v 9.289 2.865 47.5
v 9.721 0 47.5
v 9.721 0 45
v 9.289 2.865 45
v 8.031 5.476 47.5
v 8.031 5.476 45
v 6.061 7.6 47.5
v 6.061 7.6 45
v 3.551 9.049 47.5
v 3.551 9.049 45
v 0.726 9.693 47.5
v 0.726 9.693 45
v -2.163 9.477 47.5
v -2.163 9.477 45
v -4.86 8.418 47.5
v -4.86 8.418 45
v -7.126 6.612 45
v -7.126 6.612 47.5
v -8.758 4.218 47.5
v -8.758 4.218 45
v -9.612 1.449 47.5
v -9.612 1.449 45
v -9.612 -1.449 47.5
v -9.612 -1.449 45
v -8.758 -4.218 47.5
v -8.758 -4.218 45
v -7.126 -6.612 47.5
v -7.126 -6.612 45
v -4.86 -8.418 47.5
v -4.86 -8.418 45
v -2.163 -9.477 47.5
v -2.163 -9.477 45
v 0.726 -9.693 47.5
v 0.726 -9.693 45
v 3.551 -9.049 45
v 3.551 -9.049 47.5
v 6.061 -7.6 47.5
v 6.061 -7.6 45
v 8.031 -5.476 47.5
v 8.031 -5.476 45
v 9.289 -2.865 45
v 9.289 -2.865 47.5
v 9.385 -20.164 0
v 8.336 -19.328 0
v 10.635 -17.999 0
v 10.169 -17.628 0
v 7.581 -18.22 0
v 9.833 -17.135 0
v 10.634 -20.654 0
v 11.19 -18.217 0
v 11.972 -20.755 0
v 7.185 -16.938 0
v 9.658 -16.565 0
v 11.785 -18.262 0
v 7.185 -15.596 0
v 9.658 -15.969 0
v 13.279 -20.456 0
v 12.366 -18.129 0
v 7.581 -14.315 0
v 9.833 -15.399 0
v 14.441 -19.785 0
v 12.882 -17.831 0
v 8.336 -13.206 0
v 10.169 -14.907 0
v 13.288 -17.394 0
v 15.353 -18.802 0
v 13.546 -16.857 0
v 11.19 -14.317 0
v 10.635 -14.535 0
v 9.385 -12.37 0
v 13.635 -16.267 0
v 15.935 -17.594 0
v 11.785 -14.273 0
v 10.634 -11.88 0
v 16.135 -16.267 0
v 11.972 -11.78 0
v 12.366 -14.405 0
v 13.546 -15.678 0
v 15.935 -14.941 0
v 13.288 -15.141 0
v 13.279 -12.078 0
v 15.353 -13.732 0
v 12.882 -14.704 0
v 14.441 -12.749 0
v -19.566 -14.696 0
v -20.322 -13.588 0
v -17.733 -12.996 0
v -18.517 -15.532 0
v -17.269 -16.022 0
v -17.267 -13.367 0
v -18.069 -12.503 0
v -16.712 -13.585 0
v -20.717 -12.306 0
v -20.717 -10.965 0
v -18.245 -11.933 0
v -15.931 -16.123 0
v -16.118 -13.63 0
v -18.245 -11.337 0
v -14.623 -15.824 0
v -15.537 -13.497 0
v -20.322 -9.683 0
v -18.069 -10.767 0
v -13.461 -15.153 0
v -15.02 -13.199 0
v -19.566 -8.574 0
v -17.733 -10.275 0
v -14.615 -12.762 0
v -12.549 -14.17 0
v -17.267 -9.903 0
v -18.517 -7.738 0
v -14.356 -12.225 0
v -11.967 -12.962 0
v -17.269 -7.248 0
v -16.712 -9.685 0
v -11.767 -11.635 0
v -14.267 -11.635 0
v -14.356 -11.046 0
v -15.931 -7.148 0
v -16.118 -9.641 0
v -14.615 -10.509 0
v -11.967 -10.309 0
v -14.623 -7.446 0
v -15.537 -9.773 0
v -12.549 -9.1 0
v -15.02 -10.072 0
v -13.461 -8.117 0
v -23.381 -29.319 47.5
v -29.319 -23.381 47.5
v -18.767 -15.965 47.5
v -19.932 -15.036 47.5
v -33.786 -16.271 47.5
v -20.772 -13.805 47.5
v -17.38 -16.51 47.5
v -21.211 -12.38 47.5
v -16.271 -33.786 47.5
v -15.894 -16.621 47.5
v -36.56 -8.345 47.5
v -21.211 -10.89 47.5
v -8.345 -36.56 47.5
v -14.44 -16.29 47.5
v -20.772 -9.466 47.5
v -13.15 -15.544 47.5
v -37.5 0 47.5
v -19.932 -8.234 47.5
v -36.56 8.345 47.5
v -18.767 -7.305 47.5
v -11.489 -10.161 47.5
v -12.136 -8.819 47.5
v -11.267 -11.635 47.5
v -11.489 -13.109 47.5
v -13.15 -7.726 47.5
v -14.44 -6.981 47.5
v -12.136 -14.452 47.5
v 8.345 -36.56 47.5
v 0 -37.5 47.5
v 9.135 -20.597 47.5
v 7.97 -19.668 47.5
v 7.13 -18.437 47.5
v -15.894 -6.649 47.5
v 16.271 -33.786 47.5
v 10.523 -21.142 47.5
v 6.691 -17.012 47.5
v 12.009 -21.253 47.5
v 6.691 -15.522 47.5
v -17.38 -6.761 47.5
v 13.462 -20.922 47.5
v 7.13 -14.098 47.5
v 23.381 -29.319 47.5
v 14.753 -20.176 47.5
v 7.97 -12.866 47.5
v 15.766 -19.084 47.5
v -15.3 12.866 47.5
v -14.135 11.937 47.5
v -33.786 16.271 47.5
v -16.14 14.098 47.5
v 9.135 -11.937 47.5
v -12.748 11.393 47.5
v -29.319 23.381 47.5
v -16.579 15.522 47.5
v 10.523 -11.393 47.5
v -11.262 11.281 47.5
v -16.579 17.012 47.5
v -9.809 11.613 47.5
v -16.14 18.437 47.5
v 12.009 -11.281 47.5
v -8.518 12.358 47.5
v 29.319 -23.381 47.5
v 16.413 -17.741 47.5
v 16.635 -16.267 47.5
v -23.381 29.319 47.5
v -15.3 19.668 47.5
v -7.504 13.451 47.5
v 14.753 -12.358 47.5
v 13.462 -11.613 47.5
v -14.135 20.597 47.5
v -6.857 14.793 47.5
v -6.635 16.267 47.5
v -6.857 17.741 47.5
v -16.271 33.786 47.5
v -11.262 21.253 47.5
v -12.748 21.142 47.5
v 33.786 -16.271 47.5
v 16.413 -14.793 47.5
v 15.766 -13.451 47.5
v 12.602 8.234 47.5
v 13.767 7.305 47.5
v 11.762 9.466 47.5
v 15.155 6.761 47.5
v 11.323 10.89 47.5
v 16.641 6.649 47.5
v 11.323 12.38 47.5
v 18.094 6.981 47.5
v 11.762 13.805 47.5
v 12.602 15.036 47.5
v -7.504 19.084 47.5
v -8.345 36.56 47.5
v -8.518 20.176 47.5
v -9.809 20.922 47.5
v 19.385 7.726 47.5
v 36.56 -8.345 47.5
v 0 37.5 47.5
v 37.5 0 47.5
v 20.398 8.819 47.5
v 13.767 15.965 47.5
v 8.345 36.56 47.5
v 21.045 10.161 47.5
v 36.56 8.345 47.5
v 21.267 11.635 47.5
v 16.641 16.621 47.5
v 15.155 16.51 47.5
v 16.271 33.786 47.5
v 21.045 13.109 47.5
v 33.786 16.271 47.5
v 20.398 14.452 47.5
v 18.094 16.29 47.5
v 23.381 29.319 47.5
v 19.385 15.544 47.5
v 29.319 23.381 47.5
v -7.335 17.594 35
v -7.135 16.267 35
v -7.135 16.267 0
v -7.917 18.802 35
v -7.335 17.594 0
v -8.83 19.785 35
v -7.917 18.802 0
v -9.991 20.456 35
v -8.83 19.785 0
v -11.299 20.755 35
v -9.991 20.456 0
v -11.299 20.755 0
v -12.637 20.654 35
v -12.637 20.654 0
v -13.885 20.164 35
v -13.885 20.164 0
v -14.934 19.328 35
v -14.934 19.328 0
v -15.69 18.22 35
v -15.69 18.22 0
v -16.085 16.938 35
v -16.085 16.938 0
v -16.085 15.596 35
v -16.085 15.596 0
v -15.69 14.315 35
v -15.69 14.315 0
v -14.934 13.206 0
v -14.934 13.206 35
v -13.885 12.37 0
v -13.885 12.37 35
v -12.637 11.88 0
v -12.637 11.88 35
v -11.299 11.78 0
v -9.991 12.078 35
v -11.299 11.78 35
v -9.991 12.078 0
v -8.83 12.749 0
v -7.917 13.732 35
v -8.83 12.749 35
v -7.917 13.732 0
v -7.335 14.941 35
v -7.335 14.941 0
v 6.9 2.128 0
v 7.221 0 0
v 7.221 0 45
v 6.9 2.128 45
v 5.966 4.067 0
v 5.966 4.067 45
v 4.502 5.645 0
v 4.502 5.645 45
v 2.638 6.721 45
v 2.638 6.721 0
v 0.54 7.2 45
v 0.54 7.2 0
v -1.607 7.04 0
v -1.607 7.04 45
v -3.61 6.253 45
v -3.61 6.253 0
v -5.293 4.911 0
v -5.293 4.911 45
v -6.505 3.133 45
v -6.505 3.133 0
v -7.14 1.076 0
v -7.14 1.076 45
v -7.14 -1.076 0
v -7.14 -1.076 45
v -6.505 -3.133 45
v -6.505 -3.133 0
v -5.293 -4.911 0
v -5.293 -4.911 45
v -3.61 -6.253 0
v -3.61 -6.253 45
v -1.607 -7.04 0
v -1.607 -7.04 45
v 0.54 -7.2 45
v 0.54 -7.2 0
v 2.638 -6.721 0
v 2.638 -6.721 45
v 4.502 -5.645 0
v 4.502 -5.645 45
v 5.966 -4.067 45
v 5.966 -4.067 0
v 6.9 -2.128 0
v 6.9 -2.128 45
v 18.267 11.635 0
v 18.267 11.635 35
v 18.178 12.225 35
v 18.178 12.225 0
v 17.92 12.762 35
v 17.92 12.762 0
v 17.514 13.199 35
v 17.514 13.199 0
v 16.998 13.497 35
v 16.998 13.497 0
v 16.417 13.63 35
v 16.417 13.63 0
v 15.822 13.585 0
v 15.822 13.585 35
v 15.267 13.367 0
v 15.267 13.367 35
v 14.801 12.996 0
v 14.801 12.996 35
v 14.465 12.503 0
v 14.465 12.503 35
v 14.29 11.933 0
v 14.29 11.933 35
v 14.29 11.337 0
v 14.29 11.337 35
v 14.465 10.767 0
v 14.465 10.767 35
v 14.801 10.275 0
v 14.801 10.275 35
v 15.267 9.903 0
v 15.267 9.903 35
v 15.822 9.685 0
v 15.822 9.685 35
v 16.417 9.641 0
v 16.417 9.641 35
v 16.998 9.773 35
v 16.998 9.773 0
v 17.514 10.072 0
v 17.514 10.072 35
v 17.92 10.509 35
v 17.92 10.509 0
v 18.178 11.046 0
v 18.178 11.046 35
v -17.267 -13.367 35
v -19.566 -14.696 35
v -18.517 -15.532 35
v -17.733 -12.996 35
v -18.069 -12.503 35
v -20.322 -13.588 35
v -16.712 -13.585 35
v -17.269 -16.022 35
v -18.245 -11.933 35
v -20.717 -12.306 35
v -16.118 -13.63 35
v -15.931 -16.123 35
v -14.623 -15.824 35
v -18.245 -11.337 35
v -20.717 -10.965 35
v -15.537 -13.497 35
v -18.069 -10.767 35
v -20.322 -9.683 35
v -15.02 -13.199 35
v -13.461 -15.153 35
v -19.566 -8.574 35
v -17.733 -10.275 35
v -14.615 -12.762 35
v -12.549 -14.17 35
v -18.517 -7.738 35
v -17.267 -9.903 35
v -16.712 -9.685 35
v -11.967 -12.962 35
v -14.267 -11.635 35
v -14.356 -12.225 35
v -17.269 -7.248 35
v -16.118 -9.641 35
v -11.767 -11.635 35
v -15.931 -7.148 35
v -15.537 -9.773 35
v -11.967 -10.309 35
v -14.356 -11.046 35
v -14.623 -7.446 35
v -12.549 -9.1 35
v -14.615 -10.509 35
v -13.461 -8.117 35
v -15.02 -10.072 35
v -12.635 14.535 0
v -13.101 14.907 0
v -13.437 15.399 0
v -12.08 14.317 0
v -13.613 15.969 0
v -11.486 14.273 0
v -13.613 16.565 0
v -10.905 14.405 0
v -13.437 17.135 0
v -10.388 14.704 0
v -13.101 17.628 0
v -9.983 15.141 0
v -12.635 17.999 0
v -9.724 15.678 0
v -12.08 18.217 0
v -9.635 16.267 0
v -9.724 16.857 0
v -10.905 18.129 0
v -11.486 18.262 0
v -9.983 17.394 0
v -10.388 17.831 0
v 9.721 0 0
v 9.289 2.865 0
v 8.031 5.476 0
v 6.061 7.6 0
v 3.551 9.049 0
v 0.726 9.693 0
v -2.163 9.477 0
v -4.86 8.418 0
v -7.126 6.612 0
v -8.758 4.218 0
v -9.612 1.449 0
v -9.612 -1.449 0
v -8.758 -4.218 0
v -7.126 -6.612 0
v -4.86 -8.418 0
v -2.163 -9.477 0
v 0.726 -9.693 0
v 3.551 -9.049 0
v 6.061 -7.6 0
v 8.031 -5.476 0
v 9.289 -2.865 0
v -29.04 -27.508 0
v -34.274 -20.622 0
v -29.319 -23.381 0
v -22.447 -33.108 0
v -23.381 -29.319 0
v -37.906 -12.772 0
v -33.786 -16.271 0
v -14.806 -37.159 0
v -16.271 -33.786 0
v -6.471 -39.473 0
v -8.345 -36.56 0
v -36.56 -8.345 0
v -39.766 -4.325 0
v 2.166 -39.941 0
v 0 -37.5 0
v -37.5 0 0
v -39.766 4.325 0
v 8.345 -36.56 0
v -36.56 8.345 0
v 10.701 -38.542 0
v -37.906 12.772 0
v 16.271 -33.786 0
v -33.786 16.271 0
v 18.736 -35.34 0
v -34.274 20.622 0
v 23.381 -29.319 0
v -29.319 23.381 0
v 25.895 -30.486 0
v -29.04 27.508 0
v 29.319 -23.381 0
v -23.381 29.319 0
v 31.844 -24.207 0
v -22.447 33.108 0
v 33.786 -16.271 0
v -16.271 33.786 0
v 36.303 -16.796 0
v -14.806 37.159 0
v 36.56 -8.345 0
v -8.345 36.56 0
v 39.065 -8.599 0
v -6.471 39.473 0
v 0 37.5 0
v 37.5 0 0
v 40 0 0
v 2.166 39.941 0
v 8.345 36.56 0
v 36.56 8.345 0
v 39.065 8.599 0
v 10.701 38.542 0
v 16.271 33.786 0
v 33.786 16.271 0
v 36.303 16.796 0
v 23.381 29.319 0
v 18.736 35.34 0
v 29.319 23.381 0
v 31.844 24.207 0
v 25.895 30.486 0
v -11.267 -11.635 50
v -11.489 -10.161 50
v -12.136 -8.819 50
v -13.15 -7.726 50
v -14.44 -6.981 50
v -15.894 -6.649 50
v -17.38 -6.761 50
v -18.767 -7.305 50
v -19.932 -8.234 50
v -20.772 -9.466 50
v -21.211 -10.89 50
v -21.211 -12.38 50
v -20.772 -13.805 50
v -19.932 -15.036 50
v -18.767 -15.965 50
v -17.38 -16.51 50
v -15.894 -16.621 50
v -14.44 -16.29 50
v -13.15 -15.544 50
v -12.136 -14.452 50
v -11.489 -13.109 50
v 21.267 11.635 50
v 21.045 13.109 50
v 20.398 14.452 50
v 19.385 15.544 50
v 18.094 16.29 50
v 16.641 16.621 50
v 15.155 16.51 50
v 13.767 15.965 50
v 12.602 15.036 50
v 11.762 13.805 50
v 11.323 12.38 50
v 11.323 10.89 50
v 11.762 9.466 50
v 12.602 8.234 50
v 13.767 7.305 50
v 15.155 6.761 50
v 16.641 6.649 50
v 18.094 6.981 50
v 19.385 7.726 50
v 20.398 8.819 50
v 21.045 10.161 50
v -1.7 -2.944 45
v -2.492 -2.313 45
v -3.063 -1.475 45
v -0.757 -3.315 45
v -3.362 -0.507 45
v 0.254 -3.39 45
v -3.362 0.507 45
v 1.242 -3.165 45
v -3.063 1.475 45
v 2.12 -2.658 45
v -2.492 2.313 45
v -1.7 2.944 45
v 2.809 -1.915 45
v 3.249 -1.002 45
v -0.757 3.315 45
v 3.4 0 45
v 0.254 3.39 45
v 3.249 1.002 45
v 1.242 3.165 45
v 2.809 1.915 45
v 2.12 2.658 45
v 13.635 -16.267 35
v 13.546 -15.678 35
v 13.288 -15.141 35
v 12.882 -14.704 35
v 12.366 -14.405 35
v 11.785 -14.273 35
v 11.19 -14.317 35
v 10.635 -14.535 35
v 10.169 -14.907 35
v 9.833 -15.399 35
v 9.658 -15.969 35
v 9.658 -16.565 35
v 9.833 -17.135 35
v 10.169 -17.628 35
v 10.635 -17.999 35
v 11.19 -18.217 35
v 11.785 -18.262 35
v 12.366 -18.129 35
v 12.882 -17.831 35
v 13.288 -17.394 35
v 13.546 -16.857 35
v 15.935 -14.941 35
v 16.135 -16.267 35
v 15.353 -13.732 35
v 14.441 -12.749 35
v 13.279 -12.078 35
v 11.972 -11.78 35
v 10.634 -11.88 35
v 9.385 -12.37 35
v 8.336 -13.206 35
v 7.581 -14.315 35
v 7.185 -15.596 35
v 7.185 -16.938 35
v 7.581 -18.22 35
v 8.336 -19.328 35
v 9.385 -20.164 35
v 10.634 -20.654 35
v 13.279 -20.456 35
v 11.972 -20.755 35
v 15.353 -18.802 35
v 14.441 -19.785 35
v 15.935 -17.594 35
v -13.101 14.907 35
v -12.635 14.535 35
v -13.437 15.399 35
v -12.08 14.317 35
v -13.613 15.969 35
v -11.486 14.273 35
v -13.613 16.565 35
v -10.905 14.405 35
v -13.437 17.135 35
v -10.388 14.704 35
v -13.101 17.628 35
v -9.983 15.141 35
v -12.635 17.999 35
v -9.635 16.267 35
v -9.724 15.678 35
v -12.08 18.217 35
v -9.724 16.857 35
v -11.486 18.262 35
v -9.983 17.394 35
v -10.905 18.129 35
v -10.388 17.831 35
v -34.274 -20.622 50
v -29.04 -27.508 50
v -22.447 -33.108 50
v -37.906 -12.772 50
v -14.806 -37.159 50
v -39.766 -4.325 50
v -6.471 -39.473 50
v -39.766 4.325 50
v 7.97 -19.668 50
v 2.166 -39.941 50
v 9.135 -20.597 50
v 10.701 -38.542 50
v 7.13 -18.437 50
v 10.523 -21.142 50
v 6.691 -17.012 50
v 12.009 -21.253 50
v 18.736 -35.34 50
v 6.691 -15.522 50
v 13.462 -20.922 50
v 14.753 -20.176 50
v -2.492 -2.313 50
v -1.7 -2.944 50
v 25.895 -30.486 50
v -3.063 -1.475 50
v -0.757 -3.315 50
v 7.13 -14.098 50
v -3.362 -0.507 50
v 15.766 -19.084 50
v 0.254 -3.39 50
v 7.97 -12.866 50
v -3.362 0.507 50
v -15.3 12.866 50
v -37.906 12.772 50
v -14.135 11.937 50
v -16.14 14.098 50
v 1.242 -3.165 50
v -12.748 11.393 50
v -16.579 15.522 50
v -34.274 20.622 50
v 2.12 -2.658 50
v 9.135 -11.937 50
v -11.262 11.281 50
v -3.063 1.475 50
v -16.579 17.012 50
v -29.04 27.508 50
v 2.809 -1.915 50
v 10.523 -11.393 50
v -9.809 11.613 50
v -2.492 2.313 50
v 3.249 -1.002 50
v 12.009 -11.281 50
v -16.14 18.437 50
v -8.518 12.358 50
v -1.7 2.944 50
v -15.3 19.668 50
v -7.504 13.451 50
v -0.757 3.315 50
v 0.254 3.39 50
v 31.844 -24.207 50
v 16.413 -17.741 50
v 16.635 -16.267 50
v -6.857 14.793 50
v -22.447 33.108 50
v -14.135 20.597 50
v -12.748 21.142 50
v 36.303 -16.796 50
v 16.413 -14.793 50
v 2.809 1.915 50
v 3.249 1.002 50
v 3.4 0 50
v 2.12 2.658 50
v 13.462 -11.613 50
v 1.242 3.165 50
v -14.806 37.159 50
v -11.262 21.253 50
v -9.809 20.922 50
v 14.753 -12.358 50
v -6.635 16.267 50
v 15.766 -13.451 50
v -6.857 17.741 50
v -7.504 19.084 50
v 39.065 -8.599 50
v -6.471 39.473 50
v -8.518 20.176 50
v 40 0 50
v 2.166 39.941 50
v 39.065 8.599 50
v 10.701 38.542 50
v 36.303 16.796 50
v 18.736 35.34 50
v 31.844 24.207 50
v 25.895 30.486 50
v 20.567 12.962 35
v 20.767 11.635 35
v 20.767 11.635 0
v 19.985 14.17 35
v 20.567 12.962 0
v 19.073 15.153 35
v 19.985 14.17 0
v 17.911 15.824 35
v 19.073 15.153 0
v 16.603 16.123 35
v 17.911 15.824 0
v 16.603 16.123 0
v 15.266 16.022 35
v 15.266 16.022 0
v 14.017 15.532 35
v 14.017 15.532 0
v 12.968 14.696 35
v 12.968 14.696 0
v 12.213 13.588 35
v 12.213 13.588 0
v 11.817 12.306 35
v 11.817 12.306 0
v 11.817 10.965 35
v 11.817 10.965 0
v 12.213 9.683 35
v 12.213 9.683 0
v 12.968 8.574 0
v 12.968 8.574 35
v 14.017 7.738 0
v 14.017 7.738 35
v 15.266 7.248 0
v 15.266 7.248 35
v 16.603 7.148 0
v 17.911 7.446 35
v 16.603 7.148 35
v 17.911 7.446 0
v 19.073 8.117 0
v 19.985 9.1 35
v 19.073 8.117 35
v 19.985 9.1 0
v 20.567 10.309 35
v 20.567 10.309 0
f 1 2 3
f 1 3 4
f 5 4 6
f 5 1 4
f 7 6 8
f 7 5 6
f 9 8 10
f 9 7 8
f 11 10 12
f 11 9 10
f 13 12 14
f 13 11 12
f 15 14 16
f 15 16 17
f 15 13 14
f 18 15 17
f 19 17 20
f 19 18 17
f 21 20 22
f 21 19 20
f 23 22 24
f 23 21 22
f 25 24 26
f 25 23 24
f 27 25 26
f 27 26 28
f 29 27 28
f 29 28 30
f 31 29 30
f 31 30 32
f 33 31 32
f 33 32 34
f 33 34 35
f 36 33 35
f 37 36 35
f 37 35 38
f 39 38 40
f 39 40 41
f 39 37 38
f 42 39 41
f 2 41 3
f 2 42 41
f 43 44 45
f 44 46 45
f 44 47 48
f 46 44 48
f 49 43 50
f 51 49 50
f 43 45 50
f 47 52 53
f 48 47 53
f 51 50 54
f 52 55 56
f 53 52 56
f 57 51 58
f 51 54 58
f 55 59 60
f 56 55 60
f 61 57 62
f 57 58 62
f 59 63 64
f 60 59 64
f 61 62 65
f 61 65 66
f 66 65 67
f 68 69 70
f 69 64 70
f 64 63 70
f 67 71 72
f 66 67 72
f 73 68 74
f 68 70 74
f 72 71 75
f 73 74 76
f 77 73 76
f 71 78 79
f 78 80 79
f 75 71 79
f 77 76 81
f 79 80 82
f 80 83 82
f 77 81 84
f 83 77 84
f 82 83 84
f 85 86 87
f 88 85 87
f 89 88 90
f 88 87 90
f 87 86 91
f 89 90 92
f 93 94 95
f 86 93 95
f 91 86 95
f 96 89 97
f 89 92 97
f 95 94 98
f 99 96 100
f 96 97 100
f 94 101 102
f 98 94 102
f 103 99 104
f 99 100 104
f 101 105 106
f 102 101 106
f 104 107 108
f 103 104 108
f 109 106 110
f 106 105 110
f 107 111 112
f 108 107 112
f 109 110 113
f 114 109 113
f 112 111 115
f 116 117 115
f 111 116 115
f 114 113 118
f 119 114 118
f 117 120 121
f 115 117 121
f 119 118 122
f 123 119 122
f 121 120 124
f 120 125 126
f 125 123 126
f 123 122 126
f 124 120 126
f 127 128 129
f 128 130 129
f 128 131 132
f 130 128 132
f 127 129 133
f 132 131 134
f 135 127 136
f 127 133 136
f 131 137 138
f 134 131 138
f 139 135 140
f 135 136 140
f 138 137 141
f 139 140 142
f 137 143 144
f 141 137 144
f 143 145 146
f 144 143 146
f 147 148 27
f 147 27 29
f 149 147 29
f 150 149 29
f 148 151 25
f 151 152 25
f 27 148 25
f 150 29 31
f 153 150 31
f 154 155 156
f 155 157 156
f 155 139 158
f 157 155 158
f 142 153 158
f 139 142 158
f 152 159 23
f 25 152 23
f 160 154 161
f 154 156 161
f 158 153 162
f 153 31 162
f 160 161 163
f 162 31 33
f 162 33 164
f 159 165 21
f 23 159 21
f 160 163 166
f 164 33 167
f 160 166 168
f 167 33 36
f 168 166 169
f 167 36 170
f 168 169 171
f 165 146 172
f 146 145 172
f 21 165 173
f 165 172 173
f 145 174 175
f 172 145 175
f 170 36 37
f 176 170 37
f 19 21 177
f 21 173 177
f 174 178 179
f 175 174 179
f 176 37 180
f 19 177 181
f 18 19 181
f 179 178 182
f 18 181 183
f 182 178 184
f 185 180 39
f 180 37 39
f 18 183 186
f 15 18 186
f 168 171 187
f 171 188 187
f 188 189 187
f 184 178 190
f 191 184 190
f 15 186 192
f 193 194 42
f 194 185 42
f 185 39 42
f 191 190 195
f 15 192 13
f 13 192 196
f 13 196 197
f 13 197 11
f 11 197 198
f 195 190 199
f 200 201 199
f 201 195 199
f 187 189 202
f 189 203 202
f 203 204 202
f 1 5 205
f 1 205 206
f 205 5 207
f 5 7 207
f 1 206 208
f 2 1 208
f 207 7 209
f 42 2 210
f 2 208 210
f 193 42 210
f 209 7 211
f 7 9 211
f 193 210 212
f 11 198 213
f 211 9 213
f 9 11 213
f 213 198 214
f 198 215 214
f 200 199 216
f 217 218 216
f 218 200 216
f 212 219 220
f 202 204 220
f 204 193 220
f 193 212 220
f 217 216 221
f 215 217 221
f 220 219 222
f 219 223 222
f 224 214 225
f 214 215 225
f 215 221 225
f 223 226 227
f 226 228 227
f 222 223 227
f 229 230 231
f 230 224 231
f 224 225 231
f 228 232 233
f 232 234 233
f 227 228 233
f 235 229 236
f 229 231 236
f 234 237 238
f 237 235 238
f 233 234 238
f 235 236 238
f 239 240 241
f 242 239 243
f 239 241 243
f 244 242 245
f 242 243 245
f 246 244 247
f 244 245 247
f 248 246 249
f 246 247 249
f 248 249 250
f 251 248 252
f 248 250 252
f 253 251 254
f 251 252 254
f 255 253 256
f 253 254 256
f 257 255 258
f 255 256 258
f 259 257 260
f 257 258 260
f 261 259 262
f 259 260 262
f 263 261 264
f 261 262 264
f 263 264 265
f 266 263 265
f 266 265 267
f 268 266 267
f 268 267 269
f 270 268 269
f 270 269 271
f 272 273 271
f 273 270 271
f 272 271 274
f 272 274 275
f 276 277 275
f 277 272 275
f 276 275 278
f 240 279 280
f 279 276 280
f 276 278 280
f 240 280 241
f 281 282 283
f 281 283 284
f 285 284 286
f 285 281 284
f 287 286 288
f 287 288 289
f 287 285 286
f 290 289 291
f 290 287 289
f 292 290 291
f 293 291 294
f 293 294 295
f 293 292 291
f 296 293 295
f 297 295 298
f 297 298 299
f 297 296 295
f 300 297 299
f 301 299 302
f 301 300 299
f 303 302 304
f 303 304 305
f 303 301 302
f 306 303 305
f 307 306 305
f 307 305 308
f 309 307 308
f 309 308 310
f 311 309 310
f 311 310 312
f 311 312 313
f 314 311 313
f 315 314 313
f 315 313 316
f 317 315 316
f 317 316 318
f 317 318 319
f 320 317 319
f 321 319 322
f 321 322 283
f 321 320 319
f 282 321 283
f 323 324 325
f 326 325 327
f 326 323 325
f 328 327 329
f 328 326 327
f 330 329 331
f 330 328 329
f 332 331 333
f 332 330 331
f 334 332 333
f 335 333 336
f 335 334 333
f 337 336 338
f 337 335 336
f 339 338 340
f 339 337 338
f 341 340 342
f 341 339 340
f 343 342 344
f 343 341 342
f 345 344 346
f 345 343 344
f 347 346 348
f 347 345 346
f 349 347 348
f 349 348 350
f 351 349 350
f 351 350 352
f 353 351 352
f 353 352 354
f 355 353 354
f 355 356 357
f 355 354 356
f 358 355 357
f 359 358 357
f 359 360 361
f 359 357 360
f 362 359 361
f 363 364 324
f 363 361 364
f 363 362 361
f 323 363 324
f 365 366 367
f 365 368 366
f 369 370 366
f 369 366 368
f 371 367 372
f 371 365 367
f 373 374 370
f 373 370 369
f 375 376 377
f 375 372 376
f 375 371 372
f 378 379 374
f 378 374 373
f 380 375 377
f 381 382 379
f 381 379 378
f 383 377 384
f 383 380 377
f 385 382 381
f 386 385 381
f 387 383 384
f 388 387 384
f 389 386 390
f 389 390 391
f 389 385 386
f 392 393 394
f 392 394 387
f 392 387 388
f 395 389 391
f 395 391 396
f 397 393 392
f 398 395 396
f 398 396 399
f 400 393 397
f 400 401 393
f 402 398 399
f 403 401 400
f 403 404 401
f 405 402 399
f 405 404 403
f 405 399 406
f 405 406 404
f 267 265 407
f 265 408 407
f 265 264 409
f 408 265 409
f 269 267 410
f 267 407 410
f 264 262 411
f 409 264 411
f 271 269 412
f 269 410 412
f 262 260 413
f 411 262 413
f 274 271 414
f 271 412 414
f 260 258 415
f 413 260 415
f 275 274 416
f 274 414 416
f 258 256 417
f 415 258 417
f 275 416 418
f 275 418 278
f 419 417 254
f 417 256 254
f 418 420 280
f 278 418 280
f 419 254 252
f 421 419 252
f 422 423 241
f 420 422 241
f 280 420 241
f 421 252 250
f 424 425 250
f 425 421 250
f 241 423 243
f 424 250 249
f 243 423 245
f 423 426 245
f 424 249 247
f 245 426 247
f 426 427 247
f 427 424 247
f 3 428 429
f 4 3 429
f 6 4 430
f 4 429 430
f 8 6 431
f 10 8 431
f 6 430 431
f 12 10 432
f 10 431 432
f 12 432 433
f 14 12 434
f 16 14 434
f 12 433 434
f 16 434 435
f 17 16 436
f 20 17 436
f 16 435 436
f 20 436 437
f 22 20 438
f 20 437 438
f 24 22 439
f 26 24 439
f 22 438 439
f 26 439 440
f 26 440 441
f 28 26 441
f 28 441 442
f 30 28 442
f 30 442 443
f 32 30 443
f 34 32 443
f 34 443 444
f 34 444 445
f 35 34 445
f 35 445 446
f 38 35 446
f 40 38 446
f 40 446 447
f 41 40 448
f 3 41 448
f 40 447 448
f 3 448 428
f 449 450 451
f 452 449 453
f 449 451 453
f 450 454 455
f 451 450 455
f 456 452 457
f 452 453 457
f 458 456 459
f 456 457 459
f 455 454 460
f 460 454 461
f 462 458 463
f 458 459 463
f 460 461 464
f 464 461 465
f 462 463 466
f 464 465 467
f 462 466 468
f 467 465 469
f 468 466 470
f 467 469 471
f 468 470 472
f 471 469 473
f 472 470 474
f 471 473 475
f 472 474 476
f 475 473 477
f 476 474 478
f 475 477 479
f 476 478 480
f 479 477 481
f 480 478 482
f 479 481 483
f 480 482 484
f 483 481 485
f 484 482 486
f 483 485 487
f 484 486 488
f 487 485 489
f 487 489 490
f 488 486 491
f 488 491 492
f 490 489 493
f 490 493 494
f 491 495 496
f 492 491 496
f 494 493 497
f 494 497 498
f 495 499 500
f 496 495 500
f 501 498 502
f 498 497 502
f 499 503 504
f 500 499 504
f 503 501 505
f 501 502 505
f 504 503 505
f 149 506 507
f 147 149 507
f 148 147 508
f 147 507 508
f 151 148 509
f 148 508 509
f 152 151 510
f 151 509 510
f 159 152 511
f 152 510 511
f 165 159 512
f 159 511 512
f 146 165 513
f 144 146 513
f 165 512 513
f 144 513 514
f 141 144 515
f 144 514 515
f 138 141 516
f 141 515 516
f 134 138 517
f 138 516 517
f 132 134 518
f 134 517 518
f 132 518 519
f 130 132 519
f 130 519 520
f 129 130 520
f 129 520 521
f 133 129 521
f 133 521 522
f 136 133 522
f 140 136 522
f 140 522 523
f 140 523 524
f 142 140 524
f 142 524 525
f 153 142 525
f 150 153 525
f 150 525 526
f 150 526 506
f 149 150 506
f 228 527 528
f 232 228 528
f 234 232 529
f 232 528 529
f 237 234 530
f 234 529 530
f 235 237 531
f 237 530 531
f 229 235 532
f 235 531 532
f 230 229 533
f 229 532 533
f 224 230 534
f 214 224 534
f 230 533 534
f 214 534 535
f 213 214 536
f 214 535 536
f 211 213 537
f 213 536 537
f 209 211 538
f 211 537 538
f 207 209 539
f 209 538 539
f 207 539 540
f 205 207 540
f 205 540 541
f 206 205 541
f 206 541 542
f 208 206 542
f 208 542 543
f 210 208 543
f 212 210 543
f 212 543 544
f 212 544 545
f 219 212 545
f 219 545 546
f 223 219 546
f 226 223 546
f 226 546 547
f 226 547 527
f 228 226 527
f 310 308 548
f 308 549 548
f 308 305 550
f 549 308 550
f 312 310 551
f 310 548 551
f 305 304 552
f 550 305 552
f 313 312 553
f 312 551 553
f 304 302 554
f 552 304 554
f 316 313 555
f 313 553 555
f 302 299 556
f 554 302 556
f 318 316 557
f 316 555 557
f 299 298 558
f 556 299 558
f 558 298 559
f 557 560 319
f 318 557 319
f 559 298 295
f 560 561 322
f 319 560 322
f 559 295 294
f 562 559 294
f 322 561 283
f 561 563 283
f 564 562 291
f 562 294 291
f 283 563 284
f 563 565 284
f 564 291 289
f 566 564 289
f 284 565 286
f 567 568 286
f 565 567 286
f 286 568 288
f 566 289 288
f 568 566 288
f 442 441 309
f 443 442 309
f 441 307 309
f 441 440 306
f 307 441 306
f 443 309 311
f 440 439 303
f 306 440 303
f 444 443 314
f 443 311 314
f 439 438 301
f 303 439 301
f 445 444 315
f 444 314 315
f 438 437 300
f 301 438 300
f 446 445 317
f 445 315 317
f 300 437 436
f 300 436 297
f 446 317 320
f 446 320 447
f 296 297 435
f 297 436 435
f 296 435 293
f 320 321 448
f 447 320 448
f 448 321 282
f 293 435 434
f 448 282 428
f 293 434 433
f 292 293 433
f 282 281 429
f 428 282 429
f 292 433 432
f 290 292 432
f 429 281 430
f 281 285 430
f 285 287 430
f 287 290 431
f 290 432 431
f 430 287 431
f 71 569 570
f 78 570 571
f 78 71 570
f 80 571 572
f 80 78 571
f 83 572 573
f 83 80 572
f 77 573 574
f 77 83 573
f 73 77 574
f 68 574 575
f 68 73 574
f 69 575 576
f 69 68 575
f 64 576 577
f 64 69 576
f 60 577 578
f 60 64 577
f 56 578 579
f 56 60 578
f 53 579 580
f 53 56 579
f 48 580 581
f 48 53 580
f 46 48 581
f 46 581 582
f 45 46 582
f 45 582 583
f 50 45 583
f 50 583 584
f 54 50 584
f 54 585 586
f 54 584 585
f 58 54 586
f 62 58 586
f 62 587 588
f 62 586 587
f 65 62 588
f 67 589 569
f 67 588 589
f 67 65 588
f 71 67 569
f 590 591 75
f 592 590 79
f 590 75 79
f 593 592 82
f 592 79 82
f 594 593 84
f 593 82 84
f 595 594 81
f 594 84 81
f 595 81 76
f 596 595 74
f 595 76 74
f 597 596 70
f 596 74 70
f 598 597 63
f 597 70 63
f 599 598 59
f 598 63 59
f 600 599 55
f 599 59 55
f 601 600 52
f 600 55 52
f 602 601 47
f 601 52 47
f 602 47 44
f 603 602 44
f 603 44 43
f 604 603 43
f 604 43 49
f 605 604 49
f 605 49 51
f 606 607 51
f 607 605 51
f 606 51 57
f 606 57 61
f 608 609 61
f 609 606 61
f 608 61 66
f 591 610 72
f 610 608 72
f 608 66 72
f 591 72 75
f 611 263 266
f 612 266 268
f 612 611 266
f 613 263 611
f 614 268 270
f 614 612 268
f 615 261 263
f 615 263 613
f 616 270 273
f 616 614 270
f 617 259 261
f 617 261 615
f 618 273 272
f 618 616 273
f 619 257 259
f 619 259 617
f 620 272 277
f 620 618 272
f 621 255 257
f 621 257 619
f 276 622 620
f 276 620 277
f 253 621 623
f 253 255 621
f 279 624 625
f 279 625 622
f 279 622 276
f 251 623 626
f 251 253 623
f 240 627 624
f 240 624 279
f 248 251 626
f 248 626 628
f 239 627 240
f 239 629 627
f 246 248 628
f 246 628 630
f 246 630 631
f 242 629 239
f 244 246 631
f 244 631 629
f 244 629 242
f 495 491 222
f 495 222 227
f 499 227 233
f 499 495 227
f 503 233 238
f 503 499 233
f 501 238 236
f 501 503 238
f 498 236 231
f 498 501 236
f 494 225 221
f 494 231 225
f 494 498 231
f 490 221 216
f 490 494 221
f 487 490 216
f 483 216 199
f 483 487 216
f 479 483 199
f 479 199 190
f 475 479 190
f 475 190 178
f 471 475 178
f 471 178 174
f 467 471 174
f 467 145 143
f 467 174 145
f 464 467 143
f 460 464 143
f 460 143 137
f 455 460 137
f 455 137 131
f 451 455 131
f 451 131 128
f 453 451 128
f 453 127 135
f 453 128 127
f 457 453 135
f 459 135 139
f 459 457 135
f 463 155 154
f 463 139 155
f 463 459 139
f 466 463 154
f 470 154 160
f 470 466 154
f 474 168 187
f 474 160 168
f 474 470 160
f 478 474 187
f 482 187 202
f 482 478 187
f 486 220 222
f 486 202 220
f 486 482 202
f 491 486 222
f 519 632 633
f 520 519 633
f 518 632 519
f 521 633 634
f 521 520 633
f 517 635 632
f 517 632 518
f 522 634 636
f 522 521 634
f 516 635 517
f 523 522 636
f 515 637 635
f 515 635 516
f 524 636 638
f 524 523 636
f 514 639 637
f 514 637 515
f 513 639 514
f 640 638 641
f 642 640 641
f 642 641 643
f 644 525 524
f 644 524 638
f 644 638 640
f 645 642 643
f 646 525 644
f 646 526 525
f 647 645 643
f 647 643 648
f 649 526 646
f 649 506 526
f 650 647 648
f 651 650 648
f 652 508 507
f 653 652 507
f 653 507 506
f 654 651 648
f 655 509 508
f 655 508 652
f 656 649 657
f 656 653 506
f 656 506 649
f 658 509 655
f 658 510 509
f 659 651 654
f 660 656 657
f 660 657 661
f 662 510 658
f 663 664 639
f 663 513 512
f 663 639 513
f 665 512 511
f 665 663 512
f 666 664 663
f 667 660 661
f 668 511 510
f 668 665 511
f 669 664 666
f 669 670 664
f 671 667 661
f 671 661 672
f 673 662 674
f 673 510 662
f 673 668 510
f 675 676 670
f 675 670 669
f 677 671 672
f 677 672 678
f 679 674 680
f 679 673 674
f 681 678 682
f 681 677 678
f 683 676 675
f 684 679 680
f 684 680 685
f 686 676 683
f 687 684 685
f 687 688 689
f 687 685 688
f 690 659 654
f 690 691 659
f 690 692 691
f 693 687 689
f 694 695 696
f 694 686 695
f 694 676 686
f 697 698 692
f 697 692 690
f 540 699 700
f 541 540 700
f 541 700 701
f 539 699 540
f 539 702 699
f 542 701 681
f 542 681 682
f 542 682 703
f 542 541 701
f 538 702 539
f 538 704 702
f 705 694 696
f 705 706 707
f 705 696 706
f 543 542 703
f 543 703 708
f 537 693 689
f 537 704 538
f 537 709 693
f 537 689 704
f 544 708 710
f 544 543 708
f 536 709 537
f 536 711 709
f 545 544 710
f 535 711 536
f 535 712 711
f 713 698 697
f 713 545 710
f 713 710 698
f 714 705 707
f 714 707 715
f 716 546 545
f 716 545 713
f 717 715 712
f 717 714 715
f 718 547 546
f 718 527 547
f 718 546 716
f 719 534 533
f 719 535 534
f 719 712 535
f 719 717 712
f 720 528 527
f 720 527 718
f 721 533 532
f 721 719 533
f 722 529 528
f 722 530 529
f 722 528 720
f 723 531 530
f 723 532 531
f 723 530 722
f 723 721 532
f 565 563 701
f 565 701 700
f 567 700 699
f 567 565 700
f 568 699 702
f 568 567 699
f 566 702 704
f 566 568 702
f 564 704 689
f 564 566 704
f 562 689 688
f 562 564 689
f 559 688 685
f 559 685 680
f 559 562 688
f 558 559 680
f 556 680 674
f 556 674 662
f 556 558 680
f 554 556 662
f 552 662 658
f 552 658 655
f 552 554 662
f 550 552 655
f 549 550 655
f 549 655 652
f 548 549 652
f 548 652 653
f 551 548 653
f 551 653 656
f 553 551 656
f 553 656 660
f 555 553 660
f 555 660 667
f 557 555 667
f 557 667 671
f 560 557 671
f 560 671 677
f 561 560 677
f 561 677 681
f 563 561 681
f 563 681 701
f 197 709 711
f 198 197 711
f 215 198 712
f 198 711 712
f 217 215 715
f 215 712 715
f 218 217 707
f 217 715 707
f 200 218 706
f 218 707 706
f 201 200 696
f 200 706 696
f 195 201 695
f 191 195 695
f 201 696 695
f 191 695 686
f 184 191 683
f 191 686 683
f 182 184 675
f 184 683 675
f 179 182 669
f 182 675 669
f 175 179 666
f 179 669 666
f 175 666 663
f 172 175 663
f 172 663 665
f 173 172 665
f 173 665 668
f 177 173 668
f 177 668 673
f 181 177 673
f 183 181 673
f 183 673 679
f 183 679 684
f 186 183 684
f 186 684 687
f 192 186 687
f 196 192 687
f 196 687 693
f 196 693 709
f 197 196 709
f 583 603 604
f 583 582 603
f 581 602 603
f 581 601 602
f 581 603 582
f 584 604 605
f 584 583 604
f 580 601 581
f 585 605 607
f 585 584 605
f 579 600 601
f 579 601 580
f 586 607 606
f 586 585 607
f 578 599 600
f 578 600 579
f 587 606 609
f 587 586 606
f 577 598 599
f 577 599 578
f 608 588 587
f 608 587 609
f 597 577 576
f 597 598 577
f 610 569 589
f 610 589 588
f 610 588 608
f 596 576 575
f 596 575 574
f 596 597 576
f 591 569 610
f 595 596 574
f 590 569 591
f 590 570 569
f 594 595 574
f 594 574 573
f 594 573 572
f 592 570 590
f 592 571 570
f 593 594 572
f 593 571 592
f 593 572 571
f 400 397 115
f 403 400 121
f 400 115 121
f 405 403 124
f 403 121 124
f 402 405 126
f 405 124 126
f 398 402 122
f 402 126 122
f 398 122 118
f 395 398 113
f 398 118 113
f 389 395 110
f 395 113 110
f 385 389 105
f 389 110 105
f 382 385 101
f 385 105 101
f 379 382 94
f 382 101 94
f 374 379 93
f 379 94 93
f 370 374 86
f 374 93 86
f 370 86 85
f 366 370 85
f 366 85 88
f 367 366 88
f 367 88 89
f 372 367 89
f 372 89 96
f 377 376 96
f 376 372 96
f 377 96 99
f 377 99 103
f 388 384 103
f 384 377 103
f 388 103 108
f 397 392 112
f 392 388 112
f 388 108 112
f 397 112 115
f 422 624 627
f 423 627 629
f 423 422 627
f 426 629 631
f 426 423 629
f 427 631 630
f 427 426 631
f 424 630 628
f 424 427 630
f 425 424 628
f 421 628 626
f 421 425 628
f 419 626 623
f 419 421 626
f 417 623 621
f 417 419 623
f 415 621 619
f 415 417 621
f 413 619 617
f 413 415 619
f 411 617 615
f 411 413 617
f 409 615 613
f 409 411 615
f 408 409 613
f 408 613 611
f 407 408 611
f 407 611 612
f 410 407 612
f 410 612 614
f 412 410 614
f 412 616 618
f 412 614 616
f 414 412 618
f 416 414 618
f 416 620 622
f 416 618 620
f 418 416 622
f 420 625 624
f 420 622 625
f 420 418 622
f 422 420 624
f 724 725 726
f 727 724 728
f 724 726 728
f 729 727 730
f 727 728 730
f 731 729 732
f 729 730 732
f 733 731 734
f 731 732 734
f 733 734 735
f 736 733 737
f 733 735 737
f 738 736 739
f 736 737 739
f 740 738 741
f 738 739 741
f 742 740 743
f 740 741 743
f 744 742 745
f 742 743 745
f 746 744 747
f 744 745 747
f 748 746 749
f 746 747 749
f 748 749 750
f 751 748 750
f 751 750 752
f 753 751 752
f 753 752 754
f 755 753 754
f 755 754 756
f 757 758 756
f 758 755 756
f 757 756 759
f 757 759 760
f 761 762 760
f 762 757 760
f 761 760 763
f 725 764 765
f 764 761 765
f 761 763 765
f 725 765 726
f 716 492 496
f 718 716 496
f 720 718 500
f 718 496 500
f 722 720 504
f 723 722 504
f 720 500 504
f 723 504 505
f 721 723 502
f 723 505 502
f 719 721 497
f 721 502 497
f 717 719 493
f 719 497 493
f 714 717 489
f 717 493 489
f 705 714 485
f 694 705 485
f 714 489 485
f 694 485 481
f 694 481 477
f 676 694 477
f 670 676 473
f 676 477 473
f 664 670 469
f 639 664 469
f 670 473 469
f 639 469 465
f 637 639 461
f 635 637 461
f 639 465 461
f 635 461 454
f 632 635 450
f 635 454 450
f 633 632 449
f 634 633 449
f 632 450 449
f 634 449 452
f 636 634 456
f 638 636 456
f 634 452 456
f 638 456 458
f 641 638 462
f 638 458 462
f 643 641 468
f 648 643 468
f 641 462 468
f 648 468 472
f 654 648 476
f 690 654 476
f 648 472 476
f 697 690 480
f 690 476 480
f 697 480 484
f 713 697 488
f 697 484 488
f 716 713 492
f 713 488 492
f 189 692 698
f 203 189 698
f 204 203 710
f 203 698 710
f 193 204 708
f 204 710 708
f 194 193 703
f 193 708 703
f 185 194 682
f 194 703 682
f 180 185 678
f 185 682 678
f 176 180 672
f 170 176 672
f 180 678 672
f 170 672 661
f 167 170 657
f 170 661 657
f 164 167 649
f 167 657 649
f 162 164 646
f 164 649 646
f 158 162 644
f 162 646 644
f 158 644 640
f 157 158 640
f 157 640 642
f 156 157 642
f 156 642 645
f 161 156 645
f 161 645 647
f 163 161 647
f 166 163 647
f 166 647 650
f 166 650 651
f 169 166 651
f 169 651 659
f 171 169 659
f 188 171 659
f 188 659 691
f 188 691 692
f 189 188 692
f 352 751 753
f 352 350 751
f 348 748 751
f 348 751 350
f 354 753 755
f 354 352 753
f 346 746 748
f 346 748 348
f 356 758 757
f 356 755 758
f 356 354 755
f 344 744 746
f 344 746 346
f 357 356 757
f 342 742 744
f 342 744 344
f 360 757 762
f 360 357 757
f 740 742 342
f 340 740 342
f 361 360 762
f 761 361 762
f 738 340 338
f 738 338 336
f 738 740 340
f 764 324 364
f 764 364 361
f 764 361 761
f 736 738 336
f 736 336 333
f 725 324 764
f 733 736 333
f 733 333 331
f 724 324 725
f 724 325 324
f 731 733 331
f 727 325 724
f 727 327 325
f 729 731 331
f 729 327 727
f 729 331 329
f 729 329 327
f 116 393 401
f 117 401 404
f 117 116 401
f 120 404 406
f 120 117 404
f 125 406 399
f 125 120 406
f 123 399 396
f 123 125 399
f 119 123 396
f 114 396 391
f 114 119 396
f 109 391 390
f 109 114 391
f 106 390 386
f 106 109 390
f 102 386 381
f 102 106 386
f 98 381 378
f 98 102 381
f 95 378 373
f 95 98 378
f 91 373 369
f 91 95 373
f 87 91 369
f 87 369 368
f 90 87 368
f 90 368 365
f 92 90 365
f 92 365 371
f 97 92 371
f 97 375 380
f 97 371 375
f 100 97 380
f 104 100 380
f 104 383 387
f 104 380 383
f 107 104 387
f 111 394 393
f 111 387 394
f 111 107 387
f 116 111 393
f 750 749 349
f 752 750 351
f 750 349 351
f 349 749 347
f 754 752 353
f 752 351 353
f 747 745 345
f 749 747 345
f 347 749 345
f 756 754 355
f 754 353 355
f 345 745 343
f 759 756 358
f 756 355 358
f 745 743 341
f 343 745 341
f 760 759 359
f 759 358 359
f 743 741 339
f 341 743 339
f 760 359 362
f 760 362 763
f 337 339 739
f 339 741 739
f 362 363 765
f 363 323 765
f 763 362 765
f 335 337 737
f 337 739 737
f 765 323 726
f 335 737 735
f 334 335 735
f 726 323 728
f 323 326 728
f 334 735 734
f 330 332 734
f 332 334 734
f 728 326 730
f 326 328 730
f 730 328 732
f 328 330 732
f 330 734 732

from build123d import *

# Parameters (mm, degrees)
F0_R      = 40
F0_R_2    = 2
F0_R_3    = 3.4
F1_DEPTH  = 50
F2_R      = 7.220544461
F3_DEPTH  = 45
F4_R      = 5
F5_DEPTH  = 10
F6_T      = 2.5
F5_FACE_R = 5
F7_DEPTH  = 15


# Not quite as in the source:
# - a shell that OpenCascade refuses in one call is made with other operations: the cavity is built on its own and cut out


with BuildPart() as f1:
    # F0 (on Top) → F1 (new body)
    with BuildSketch(Plane.XY):
        Circle(F0_R)
        with Locations((-16.2671870079, -11.6352321356)):
            Circle(F0_R_2, mode=Mode.SUBTRACT)
        with Locations((11.6352321356, -16.2671870079)):
            Circle(F0_R_2, mode=Mode.SUBTRACT)
        with Locations((-11.6352321356, 16.2671870079)):
            Circle(F0_R_2, mode=Mode.SUBTRACT)
        Circle(F0_R_3, mode=Mode.SUBTRACT)
        with Locations((16.2671870079, 11.6352321356)):
            Circle(F0_R_2, mode=Mode.SUBTRACT)
    extrude(amount=F1_DEPTH)

    # F2 (on Top) → F3 (cut)
    with BuildSketch(Plane.XY):
        Circle(F2_R)
    extrude(amount=F3_DEPTH, mode=Mode.SUBTRACT)

    # F6: shell of thickness 2.5, made by hand


with BuildPart() as f5:
    # F4 (on face) → F5 (new body)
    with BuildSketch(Plane.XY.offset(50)):
        with Locations((-11.6352321356, 16.2671870079)):
            Circle(F4_R)
    extrude(amount=-F5_DEPTH)


with BuildPart() as f5b:
    # F4 (on face) → F5, piece 2 (new body)
    with BuildSketch(Plane.XY.offset(50)):
        with Locations((16.2671870079, 11.6352321356)):
            Circle(F4_R)
    extrude(amount=-F5_DEPTH)


with BuildPart() as f5c:
    # F4 (on face) → F5, piece 3 (new body)
    with BuildSketch(Plane.XY.offset(50)):
        with Locations((11.6352321356, -16.2671870079)):
            Circle(F4_R)
    extrude(amount=-F5_DEPTH)


with BuildPart() as f5d:
    # F4 (on face) → F5, piece 4 (new body)
    with BuildSketch(Plane.XY.offset(50)):
        with Locations((-16.2671870079, -11.6352321356)):
            Circle(F4_R)
    extrude(amount=-F5_DEPTH)


with BuildPart() as f6_core1:
    # F6_t2: copy of F1
    add(f1.part)

    # the walls: a layer under each face that stays
    f6_faces = [f6_core1.faces().sort_by_distance(p)[0] for p in [
        (-40, 0, 25),
        (-26.6666666667, -26.6666666667, 50),
        (-18.2671870079, -11.6352321356, 25),
        (9.6352321356, -16.2671870079, 25),
        (-7.220544461, 0, 22.5),
        (-13.6352321356, 16.2671870079, 25),
        (14.2671870079, 11.6352321356, 25),
        (-3.4, 0, 47.5),
        (-4.8136963073, -4.8136963073, 45),
    ]]
    thicken(f6_faces, amount=-F6_T, mode=Mode.SUBTRACT)

    # F6_s3 → F6_t4 (revolve, cut)
    with BuildSketch(Plane.XZ):
        Polygon((7.195544461, 44.975), (9.720544461, 45), (9.720544461, 47.5), (7.220544461, 47.5), align=None)
    revolve(axis=Axis((0, 0, 45), (0, 0, 1)), mode=Mode.SUBTRACT)


with BuildPart() as f1_1:
    add(f1.part)

    # what is left inside the walls is the cavity
    f6_cavity = [f6_core1.part.solids().sort_by_distance(p)[0] for p in [
        (-37.475, 0, 31.666667),
    ]]
    add(f6_cavity, mode=Mode.SUBTRACT)


with BuildPart() as f7_tool:
    # F5_face (on face) → F7 (new body)
    with BuildSketch(Plane(origin=(-11.6352321356, 16.2671870079, 50), x_dir=(1, 0, 0), z_dir=(0, 0, 1))):
        Circle(F5_FACE_R)
        with Locations((23.2704642711, -32.5343740159)):
            Circle(F5_FACE_R)
        with Locations((27.9024191435, -4.6319548724)):
            Circle(F5_FACE_R)
        with Locations((-4.6319548724, -27.9024191435)):
            Circle(F5_FACE_R)
    extrude(amount=-F7_DEPTH)


with BuildPart() as f1_2:
    add(f1_1.part)

    # F7: cut by f7_tool
    add(f7_tool.part, mode=Mode.SUBTRACT)


with BuildPart() as f5_1:
    add(f5.part)

    # F7: cut by f7_tool
    add(f7_tool.part, mode=Mode.SUBTRACT)


with BuildPart() as f5b_1:
    add(f5b.part)

    # F7: cut by f7_tool
    add(f7_tool.part, mode=Mode.SUBTRACT)


with BuildPart() as f5c_1:
    add(f5c.part)

    # F7: cut by f7_tool
    add(f7_tool.part, mode=Mode.SUBTRACT)


with BuildPart() as f5d_1:
    add(f5d.part)

    # F7: cut by f7_tool
    add(f7_tool.part, mode=Mode.SUBTRACT)


solid = f1_2.part
